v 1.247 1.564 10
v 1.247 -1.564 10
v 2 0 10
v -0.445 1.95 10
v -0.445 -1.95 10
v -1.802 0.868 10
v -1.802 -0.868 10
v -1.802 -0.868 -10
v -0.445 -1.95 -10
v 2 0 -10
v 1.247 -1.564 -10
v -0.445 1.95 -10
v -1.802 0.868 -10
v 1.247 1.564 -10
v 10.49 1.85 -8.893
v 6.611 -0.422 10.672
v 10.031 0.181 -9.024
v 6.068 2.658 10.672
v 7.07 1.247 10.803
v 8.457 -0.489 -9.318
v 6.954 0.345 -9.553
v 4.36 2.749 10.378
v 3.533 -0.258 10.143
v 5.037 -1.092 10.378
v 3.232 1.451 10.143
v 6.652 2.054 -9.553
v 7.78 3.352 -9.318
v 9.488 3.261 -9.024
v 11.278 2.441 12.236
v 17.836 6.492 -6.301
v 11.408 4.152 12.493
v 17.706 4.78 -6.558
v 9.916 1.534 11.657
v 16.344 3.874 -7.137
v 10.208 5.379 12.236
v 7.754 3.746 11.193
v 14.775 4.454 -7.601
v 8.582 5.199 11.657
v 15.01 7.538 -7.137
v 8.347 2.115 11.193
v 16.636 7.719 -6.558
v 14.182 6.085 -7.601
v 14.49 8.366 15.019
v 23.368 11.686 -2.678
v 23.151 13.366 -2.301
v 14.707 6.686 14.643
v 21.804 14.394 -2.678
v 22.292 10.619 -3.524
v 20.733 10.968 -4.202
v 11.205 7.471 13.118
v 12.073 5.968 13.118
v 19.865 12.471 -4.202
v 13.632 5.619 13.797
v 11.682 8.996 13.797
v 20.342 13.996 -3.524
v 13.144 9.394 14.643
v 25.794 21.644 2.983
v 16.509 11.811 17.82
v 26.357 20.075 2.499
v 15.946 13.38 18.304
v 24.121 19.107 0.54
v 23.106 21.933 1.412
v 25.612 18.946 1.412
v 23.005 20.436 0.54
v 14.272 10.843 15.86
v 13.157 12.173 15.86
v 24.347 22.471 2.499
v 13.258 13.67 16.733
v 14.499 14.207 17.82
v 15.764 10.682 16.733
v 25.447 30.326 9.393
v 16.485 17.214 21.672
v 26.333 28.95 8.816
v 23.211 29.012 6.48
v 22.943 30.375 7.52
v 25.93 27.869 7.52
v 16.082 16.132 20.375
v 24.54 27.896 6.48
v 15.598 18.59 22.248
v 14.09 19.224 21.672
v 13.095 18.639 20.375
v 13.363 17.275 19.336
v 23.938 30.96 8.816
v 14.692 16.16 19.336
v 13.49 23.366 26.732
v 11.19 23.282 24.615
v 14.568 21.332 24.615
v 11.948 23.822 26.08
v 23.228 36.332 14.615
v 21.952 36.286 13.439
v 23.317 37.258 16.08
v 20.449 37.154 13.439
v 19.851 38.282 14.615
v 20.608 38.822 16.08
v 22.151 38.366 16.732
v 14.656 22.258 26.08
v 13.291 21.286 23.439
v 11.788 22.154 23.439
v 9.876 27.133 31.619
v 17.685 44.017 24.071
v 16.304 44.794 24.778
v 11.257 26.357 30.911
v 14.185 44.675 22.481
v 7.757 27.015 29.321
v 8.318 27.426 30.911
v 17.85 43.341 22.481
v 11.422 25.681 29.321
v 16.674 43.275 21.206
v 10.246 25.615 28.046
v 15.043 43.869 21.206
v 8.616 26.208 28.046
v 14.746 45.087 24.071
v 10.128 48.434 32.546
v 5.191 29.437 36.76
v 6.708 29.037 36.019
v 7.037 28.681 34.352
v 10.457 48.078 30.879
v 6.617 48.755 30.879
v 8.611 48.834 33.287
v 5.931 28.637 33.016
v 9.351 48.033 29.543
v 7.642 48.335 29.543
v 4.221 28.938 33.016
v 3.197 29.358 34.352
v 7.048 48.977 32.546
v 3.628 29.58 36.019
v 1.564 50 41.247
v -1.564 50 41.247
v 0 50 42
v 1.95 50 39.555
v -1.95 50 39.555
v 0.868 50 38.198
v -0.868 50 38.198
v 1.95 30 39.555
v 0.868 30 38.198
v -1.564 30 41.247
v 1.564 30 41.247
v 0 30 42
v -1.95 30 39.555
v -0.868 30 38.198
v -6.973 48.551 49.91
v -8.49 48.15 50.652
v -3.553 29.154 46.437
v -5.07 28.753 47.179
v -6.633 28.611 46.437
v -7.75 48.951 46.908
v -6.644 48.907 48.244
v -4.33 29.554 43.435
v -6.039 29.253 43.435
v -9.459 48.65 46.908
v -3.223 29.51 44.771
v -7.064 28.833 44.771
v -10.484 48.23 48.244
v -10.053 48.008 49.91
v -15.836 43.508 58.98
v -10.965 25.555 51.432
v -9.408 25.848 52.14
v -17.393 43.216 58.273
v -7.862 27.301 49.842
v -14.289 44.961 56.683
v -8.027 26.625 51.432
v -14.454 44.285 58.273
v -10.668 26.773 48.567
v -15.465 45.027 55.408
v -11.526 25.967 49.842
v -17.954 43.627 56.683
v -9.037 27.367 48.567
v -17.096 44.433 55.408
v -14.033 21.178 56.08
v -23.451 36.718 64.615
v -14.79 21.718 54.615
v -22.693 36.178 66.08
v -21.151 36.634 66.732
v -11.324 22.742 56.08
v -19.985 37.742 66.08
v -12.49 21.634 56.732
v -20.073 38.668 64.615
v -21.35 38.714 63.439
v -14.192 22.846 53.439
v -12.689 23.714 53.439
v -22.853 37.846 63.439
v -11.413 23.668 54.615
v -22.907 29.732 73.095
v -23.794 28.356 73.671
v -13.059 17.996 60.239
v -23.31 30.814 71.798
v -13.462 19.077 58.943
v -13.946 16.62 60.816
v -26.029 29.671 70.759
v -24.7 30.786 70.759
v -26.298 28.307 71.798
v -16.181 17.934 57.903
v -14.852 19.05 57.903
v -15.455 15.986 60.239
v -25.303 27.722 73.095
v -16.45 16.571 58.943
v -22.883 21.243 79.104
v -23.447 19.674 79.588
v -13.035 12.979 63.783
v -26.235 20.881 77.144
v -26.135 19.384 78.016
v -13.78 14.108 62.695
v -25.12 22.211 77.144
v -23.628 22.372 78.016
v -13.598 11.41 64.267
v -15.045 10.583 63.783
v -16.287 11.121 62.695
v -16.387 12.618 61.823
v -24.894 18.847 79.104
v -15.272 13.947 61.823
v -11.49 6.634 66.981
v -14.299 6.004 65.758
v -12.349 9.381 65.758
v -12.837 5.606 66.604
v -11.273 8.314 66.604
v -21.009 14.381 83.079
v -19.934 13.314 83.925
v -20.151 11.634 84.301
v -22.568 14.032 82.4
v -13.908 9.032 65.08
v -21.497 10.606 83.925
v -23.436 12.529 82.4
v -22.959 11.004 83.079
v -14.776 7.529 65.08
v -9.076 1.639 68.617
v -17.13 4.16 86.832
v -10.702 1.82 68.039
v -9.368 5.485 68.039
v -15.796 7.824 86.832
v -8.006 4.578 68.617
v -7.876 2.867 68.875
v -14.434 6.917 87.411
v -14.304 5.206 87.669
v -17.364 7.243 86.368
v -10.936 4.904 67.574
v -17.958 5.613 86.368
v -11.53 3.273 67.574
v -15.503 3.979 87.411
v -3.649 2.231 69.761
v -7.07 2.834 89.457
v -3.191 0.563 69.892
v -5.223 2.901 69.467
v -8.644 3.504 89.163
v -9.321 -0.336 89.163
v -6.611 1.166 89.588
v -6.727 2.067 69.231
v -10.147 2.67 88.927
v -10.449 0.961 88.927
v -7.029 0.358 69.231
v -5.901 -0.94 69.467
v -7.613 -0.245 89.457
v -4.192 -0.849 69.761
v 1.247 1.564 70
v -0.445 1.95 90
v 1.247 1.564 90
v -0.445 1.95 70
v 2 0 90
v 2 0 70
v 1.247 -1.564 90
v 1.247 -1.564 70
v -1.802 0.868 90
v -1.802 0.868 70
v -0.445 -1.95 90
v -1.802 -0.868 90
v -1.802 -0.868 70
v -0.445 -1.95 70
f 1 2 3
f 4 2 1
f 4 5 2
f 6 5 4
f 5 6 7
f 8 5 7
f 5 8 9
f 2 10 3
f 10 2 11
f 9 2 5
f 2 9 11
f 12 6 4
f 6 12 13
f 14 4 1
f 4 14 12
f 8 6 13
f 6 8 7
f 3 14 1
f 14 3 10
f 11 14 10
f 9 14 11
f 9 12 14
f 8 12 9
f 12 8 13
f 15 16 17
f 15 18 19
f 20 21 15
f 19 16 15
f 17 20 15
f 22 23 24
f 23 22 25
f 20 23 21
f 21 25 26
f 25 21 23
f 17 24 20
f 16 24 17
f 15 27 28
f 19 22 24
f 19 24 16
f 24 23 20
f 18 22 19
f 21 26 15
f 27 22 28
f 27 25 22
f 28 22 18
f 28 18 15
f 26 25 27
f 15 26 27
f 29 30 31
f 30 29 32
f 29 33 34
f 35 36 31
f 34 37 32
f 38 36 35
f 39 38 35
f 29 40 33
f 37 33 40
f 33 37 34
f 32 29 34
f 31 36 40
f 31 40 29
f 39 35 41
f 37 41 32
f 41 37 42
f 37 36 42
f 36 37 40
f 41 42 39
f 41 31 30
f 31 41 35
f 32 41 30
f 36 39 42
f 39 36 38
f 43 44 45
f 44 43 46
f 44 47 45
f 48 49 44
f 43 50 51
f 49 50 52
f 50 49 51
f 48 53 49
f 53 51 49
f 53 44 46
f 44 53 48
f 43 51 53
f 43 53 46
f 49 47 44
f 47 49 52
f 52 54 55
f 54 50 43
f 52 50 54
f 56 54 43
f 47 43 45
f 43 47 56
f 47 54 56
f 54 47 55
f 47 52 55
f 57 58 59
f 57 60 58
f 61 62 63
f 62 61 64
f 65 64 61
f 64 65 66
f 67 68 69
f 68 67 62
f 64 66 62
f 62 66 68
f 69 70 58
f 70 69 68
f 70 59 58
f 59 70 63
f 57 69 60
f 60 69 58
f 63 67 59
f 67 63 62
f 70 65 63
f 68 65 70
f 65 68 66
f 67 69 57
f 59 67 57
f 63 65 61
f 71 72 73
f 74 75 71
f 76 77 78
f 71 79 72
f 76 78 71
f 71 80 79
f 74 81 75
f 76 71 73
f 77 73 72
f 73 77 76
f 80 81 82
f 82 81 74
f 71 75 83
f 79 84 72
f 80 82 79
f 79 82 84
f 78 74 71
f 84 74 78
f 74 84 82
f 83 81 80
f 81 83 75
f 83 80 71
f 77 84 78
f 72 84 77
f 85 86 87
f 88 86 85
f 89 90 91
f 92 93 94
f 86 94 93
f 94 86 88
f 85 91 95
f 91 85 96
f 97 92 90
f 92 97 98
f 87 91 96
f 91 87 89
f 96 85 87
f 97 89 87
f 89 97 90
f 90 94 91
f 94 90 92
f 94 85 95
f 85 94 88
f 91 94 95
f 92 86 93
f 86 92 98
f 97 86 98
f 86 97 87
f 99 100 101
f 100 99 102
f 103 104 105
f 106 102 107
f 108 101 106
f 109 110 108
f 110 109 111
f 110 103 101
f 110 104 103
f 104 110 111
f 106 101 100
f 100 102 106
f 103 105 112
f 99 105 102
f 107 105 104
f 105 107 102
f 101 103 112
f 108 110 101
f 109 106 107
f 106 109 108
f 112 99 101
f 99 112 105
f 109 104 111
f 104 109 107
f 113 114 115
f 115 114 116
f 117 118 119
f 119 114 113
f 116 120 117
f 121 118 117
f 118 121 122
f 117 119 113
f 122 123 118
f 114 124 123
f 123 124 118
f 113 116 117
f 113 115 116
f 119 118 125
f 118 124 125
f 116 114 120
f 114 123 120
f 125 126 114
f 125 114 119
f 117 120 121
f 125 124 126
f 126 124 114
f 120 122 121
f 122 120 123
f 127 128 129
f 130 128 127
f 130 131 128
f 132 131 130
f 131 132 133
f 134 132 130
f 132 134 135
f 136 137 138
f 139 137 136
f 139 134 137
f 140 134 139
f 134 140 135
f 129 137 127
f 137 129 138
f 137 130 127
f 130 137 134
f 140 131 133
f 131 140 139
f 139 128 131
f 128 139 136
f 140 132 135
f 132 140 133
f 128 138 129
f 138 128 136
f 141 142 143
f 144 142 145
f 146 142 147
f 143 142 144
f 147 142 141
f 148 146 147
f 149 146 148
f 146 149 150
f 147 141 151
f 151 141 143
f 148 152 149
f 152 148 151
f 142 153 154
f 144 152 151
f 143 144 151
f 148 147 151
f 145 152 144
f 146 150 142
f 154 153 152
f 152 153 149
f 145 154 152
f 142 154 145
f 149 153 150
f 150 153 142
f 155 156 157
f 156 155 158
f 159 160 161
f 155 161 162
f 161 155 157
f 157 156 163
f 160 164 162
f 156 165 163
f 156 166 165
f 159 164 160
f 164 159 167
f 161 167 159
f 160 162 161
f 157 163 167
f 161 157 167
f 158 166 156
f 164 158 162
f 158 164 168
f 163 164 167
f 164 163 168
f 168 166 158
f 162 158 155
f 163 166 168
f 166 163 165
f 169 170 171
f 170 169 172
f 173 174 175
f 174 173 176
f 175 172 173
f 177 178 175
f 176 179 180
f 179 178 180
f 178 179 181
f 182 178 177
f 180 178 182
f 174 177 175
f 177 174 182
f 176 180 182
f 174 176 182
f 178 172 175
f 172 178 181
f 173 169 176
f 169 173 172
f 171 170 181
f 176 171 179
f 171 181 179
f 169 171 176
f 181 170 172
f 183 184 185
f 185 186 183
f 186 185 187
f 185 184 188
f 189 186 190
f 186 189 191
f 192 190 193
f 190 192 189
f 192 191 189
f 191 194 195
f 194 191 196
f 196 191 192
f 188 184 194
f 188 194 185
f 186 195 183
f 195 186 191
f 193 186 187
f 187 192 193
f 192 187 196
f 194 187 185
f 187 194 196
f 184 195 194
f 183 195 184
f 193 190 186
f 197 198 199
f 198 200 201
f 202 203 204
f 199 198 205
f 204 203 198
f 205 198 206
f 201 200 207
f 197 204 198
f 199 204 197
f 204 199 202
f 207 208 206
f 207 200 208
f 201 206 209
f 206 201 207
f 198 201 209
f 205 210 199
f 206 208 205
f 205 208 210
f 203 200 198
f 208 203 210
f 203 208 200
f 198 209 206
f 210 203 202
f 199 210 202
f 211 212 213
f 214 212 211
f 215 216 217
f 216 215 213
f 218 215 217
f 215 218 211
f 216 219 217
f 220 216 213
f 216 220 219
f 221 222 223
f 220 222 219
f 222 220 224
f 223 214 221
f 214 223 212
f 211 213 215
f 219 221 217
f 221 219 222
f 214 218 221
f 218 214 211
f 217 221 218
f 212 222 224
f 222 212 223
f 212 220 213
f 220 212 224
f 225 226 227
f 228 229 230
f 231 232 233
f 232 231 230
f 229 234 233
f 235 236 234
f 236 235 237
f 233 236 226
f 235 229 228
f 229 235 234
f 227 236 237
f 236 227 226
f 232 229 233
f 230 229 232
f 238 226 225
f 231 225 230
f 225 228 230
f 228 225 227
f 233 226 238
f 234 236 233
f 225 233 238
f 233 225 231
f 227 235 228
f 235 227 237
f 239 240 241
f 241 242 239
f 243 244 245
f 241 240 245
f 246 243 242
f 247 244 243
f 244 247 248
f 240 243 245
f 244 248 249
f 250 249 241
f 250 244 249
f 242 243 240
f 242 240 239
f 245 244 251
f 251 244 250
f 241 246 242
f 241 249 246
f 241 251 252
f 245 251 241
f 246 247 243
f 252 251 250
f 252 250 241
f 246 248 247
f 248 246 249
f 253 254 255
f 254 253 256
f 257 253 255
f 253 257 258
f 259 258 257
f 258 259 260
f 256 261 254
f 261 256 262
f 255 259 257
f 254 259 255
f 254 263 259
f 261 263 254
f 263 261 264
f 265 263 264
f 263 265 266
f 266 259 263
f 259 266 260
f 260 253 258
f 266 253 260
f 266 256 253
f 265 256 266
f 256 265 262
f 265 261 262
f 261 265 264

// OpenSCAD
// enable animate (view->animate)
// set FPS=20 Steps=360
module
q()
{
    cube([ 10, 1, 1 ], center = true);
}

module
c()
{
    cube([ 1, 1, 1 ], center = true);
}
module
o()
{
    cylinder(1, 2, 2);
} 
module
main11()
{
    color("gold") translate([ 0, 0, 20 * (2) ])
        //     rotate([0,0,$t*360])
        for (r = [180:10:360])
    {
        rotate([ 0, 0, r ]) for (i = [0:60:360])
        {
            rotate([ 0, r, i * sin($t * 360 * 1) ])
                translate([ 0, $t * 360 / 30, 30 ]) scale([ 1, 1, 20 ]) o();
        }
    }
} 
main11();
